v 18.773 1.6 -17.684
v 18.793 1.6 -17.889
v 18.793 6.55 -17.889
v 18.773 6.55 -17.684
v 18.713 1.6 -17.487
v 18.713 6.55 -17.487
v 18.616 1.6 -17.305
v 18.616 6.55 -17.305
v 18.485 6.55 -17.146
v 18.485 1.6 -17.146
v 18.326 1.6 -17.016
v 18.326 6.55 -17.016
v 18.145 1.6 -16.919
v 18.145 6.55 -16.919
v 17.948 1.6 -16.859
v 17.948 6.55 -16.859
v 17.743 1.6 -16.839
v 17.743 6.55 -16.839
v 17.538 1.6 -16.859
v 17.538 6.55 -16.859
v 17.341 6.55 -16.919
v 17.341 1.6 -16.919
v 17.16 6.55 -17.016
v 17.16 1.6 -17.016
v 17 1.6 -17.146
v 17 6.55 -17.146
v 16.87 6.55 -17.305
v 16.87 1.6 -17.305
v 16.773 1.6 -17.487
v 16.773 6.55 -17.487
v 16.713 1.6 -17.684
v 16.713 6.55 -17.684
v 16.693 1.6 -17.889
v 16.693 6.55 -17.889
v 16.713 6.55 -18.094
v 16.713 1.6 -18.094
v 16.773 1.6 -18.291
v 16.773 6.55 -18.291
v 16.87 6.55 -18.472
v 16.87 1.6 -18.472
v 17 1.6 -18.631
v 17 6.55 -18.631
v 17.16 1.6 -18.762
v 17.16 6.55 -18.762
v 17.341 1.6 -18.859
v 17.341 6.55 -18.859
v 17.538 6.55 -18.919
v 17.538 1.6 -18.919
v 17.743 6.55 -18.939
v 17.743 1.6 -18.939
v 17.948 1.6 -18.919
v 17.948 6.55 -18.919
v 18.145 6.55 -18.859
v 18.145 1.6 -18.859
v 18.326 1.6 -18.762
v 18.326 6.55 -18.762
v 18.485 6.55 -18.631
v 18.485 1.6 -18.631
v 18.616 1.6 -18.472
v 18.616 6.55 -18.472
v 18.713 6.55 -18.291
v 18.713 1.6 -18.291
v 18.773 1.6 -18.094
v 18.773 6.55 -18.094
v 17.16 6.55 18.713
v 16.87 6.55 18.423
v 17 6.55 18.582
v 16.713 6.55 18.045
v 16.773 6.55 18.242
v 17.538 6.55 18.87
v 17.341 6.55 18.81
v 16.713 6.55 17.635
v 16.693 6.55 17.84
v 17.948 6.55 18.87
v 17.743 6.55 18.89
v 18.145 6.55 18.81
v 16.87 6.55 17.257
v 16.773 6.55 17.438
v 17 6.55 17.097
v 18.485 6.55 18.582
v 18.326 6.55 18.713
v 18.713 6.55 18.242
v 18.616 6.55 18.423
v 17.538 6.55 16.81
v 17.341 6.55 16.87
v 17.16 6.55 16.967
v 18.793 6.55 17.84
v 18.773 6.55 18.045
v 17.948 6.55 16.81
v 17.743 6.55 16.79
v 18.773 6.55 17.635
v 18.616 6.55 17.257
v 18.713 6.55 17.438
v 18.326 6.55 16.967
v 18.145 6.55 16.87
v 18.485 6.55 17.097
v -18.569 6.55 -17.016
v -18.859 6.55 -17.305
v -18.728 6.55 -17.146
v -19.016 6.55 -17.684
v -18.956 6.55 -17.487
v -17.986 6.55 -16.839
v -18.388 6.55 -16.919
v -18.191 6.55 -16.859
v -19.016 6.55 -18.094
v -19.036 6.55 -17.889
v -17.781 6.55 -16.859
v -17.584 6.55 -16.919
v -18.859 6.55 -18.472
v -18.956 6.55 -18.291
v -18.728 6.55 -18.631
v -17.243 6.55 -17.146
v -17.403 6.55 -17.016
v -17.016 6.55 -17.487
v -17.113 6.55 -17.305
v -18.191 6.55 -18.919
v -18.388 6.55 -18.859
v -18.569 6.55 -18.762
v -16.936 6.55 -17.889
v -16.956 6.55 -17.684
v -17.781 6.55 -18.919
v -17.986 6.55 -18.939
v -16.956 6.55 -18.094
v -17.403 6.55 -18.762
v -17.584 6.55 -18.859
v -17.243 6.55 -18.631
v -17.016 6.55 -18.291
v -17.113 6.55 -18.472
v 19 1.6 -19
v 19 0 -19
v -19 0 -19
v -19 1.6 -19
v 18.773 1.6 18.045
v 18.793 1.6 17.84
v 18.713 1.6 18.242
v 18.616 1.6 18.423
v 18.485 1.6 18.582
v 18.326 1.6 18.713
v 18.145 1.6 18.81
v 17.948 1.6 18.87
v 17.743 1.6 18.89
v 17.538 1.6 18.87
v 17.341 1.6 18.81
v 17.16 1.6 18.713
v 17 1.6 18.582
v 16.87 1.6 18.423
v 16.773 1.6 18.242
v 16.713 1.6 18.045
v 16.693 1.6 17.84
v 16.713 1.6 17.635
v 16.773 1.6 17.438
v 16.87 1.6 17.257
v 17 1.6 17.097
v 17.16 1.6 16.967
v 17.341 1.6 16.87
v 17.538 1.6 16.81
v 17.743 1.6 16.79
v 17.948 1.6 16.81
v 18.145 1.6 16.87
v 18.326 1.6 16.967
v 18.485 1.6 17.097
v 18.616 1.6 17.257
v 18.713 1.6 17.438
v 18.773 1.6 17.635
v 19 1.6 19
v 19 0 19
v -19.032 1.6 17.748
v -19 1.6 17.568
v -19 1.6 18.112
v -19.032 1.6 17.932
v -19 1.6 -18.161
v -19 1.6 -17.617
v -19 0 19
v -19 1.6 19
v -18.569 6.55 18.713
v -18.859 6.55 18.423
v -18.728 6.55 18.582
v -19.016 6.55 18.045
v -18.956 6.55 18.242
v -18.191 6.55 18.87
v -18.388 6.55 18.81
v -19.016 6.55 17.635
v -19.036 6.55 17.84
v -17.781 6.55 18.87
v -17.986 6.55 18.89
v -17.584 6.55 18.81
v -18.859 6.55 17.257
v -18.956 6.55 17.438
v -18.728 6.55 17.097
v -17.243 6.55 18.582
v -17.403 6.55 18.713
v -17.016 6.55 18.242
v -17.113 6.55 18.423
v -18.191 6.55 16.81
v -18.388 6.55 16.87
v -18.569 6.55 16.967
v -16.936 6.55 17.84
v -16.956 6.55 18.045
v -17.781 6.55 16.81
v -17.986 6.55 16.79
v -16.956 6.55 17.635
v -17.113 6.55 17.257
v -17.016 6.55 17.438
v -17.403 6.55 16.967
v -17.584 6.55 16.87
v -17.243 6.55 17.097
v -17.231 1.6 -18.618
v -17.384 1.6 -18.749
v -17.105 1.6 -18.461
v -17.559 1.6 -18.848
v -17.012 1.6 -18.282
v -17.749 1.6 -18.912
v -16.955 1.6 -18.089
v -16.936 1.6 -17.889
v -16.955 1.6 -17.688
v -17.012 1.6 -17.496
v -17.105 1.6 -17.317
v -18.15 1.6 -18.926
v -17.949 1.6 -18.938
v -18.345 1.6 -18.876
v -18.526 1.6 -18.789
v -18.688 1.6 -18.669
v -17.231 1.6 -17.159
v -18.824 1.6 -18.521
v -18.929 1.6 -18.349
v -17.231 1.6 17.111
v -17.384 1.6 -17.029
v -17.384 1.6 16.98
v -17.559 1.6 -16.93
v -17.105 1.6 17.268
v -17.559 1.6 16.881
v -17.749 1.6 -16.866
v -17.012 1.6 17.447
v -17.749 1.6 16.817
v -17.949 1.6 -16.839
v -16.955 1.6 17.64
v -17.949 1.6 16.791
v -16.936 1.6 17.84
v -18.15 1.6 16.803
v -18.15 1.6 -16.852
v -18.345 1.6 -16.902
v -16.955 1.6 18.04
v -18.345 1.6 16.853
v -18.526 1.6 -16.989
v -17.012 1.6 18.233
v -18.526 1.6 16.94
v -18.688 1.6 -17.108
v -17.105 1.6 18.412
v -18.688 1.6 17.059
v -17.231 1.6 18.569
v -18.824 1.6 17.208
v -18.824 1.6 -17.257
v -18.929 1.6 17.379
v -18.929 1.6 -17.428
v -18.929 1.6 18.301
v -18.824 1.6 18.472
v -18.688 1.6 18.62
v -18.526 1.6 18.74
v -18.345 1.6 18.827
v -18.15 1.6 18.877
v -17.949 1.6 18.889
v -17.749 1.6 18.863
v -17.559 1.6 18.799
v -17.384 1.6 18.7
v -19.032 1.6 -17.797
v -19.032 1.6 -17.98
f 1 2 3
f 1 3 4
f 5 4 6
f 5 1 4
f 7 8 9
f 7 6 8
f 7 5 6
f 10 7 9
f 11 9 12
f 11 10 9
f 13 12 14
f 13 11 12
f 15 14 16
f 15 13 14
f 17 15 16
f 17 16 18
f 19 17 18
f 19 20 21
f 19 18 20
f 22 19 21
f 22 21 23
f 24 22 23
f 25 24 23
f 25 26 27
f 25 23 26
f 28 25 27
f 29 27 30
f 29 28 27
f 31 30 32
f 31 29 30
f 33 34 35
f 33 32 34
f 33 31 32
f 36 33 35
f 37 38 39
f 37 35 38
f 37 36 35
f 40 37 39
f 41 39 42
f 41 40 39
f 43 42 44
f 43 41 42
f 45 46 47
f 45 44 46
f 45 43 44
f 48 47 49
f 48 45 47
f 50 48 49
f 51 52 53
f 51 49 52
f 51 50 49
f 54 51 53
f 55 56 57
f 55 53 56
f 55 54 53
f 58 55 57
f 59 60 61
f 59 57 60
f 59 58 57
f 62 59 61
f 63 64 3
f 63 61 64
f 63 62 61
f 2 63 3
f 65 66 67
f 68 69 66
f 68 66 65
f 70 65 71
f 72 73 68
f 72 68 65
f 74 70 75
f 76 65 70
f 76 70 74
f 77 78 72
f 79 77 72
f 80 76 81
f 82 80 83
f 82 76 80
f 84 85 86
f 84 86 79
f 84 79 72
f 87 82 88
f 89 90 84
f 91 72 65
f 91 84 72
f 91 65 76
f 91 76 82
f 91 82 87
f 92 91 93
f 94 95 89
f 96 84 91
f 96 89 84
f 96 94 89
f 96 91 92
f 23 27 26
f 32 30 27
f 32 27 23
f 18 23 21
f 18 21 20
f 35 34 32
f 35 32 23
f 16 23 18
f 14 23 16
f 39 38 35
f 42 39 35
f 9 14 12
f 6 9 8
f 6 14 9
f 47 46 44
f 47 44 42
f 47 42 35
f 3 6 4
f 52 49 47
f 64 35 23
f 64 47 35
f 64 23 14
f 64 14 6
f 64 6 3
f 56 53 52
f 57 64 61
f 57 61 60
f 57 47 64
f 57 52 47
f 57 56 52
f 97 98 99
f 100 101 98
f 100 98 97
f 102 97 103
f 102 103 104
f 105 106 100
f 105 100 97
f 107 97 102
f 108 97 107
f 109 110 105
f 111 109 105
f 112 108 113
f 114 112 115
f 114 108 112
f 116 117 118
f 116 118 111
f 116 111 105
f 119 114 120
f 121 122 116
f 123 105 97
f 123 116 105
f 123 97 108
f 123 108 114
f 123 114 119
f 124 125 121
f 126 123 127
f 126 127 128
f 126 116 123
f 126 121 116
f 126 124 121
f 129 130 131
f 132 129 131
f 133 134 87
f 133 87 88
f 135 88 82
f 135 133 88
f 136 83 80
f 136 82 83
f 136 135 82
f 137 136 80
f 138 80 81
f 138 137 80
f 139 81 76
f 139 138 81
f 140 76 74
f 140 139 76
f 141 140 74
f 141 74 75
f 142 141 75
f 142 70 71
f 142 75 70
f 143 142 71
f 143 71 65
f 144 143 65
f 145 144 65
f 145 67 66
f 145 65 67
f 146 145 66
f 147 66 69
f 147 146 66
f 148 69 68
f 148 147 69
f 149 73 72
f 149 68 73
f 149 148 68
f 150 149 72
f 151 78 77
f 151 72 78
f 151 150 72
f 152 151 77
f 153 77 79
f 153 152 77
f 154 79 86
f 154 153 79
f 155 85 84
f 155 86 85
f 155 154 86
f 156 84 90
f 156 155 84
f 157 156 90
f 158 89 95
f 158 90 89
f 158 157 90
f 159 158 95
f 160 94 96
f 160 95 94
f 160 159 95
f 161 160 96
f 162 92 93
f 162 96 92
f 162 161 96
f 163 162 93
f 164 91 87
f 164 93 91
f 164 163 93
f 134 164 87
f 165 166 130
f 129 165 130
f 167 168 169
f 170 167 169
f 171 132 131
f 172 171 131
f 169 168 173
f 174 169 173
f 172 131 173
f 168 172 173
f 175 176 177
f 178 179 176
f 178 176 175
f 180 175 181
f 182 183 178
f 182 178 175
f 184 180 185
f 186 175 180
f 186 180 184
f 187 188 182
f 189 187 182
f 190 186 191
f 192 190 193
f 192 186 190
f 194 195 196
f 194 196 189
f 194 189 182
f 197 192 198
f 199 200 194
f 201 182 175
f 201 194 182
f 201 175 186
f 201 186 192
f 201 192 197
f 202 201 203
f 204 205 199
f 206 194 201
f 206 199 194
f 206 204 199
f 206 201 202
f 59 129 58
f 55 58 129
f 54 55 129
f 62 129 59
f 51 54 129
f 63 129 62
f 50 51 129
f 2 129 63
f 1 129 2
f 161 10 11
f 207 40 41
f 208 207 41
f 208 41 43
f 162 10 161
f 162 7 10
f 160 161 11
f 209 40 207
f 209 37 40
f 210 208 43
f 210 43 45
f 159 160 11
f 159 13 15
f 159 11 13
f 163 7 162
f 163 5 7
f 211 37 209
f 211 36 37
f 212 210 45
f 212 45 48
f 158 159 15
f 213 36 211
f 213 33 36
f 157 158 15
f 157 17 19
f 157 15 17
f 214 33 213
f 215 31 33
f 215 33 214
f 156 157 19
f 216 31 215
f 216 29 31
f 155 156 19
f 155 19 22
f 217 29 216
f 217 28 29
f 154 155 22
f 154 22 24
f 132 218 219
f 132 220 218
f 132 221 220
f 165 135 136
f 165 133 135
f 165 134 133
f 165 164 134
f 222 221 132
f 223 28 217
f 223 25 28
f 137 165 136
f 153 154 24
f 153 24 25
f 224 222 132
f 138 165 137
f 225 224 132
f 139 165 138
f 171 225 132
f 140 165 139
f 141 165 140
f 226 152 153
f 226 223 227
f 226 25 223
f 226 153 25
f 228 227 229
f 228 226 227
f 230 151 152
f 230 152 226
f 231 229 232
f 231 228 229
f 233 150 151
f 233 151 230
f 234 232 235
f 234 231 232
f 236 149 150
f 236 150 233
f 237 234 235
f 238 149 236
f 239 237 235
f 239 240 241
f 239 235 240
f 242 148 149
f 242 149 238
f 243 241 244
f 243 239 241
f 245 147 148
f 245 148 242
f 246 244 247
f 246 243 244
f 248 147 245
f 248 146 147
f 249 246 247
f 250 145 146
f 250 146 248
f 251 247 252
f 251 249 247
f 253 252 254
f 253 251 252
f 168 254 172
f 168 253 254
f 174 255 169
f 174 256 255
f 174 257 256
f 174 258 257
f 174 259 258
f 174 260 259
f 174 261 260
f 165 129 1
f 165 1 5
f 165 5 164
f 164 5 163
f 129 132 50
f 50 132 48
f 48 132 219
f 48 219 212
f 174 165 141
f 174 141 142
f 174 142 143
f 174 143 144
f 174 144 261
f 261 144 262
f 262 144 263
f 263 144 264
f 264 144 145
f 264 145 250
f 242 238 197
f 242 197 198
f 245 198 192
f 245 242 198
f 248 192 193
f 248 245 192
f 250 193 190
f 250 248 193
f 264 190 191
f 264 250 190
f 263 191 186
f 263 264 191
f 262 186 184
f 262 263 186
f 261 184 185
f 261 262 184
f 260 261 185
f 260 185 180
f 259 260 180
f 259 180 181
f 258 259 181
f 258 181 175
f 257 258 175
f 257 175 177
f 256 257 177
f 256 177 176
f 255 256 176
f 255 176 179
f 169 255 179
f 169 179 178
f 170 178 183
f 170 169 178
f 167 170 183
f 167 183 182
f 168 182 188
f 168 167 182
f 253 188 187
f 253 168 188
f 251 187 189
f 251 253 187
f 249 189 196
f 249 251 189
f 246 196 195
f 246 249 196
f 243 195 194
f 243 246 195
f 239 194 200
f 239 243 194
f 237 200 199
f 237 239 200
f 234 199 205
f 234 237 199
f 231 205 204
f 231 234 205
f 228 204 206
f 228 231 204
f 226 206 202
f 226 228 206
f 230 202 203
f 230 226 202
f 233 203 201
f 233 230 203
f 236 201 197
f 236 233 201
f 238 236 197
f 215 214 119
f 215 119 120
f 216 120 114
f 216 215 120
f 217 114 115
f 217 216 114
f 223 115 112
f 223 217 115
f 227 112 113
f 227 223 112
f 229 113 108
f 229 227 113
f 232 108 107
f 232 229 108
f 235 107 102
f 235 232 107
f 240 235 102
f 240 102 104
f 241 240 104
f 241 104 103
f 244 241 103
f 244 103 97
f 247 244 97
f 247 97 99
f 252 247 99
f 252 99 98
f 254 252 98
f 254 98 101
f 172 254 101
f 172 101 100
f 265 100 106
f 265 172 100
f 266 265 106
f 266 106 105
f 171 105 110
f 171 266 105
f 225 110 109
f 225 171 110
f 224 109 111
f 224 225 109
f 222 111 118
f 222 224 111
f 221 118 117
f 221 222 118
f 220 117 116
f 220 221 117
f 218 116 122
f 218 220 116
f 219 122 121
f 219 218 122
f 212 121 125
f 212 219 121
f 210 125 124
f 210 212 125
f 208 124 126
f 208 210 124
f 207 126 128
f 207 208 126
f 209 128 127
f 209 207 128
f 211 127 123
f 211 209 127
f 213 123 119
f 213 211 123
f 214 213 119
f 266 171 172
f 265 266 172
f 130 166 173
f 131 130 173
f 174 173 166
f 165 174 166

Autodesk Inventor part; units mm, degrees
ref_plane "YZ Plane" through (0, 0, 0) normal (1, 0, 0) x (0, 1, 0)
ref_plane "XZ Plane" through (0, 0, 0) normal (0, 1, 0) x (-1, 0, 0)
ref_plane "XY Plane" through (0, 0, 0) normal (0, 0, 1) x (1, 0, 0)
sketch "Sketch1" plane through (0, 0, 0) normal (0, 1, 0) x (-1, 0, 0)
  line L0 (19, 19) -> (-19, 19)
  line L1 (-19, 19) -> (-19, -19)
  line L2 (-19, -19) -> (19, -19)
  line L3 (19, -19) -> (19, 19)
  dimension "d0" = 38
  dimension "d1" = 38
extrude "Extrusion1" add sketch "Sketch1" along normal blind 1.6
sketch "Sketch2" plane through (0, 1.6, 0) normal (0, 1, 0) x (1, 0, 0)
  line L0 (19, -19) -> (19, 19) projected
  circle A0 centre (17.7429, 17.8888) radius 1.05
  circle A1 centre (17.7429, -17.8399) radius 1.05
  circle A2 centre (-17.9859, -17.8399) radius 1.05
  circle A3 centre (-17.9859, 17.8888) radius 1.05
  point P0 (0, 0)
  dimension "d7" = 2.1
  dimension "d8" = 2.1
  dimension "d9" = 2.1
  dimension "d10" = 2.1
extrude "Extrusion2" add sketch "Sketch2" along normal blind 4.95
sketch "Sketch3" plane through (0, 1.6, 0) normal (0, 1, 0) x (1, 0, 0)
  point P0 (0, 0)
properties part number "Camera Bottom"
